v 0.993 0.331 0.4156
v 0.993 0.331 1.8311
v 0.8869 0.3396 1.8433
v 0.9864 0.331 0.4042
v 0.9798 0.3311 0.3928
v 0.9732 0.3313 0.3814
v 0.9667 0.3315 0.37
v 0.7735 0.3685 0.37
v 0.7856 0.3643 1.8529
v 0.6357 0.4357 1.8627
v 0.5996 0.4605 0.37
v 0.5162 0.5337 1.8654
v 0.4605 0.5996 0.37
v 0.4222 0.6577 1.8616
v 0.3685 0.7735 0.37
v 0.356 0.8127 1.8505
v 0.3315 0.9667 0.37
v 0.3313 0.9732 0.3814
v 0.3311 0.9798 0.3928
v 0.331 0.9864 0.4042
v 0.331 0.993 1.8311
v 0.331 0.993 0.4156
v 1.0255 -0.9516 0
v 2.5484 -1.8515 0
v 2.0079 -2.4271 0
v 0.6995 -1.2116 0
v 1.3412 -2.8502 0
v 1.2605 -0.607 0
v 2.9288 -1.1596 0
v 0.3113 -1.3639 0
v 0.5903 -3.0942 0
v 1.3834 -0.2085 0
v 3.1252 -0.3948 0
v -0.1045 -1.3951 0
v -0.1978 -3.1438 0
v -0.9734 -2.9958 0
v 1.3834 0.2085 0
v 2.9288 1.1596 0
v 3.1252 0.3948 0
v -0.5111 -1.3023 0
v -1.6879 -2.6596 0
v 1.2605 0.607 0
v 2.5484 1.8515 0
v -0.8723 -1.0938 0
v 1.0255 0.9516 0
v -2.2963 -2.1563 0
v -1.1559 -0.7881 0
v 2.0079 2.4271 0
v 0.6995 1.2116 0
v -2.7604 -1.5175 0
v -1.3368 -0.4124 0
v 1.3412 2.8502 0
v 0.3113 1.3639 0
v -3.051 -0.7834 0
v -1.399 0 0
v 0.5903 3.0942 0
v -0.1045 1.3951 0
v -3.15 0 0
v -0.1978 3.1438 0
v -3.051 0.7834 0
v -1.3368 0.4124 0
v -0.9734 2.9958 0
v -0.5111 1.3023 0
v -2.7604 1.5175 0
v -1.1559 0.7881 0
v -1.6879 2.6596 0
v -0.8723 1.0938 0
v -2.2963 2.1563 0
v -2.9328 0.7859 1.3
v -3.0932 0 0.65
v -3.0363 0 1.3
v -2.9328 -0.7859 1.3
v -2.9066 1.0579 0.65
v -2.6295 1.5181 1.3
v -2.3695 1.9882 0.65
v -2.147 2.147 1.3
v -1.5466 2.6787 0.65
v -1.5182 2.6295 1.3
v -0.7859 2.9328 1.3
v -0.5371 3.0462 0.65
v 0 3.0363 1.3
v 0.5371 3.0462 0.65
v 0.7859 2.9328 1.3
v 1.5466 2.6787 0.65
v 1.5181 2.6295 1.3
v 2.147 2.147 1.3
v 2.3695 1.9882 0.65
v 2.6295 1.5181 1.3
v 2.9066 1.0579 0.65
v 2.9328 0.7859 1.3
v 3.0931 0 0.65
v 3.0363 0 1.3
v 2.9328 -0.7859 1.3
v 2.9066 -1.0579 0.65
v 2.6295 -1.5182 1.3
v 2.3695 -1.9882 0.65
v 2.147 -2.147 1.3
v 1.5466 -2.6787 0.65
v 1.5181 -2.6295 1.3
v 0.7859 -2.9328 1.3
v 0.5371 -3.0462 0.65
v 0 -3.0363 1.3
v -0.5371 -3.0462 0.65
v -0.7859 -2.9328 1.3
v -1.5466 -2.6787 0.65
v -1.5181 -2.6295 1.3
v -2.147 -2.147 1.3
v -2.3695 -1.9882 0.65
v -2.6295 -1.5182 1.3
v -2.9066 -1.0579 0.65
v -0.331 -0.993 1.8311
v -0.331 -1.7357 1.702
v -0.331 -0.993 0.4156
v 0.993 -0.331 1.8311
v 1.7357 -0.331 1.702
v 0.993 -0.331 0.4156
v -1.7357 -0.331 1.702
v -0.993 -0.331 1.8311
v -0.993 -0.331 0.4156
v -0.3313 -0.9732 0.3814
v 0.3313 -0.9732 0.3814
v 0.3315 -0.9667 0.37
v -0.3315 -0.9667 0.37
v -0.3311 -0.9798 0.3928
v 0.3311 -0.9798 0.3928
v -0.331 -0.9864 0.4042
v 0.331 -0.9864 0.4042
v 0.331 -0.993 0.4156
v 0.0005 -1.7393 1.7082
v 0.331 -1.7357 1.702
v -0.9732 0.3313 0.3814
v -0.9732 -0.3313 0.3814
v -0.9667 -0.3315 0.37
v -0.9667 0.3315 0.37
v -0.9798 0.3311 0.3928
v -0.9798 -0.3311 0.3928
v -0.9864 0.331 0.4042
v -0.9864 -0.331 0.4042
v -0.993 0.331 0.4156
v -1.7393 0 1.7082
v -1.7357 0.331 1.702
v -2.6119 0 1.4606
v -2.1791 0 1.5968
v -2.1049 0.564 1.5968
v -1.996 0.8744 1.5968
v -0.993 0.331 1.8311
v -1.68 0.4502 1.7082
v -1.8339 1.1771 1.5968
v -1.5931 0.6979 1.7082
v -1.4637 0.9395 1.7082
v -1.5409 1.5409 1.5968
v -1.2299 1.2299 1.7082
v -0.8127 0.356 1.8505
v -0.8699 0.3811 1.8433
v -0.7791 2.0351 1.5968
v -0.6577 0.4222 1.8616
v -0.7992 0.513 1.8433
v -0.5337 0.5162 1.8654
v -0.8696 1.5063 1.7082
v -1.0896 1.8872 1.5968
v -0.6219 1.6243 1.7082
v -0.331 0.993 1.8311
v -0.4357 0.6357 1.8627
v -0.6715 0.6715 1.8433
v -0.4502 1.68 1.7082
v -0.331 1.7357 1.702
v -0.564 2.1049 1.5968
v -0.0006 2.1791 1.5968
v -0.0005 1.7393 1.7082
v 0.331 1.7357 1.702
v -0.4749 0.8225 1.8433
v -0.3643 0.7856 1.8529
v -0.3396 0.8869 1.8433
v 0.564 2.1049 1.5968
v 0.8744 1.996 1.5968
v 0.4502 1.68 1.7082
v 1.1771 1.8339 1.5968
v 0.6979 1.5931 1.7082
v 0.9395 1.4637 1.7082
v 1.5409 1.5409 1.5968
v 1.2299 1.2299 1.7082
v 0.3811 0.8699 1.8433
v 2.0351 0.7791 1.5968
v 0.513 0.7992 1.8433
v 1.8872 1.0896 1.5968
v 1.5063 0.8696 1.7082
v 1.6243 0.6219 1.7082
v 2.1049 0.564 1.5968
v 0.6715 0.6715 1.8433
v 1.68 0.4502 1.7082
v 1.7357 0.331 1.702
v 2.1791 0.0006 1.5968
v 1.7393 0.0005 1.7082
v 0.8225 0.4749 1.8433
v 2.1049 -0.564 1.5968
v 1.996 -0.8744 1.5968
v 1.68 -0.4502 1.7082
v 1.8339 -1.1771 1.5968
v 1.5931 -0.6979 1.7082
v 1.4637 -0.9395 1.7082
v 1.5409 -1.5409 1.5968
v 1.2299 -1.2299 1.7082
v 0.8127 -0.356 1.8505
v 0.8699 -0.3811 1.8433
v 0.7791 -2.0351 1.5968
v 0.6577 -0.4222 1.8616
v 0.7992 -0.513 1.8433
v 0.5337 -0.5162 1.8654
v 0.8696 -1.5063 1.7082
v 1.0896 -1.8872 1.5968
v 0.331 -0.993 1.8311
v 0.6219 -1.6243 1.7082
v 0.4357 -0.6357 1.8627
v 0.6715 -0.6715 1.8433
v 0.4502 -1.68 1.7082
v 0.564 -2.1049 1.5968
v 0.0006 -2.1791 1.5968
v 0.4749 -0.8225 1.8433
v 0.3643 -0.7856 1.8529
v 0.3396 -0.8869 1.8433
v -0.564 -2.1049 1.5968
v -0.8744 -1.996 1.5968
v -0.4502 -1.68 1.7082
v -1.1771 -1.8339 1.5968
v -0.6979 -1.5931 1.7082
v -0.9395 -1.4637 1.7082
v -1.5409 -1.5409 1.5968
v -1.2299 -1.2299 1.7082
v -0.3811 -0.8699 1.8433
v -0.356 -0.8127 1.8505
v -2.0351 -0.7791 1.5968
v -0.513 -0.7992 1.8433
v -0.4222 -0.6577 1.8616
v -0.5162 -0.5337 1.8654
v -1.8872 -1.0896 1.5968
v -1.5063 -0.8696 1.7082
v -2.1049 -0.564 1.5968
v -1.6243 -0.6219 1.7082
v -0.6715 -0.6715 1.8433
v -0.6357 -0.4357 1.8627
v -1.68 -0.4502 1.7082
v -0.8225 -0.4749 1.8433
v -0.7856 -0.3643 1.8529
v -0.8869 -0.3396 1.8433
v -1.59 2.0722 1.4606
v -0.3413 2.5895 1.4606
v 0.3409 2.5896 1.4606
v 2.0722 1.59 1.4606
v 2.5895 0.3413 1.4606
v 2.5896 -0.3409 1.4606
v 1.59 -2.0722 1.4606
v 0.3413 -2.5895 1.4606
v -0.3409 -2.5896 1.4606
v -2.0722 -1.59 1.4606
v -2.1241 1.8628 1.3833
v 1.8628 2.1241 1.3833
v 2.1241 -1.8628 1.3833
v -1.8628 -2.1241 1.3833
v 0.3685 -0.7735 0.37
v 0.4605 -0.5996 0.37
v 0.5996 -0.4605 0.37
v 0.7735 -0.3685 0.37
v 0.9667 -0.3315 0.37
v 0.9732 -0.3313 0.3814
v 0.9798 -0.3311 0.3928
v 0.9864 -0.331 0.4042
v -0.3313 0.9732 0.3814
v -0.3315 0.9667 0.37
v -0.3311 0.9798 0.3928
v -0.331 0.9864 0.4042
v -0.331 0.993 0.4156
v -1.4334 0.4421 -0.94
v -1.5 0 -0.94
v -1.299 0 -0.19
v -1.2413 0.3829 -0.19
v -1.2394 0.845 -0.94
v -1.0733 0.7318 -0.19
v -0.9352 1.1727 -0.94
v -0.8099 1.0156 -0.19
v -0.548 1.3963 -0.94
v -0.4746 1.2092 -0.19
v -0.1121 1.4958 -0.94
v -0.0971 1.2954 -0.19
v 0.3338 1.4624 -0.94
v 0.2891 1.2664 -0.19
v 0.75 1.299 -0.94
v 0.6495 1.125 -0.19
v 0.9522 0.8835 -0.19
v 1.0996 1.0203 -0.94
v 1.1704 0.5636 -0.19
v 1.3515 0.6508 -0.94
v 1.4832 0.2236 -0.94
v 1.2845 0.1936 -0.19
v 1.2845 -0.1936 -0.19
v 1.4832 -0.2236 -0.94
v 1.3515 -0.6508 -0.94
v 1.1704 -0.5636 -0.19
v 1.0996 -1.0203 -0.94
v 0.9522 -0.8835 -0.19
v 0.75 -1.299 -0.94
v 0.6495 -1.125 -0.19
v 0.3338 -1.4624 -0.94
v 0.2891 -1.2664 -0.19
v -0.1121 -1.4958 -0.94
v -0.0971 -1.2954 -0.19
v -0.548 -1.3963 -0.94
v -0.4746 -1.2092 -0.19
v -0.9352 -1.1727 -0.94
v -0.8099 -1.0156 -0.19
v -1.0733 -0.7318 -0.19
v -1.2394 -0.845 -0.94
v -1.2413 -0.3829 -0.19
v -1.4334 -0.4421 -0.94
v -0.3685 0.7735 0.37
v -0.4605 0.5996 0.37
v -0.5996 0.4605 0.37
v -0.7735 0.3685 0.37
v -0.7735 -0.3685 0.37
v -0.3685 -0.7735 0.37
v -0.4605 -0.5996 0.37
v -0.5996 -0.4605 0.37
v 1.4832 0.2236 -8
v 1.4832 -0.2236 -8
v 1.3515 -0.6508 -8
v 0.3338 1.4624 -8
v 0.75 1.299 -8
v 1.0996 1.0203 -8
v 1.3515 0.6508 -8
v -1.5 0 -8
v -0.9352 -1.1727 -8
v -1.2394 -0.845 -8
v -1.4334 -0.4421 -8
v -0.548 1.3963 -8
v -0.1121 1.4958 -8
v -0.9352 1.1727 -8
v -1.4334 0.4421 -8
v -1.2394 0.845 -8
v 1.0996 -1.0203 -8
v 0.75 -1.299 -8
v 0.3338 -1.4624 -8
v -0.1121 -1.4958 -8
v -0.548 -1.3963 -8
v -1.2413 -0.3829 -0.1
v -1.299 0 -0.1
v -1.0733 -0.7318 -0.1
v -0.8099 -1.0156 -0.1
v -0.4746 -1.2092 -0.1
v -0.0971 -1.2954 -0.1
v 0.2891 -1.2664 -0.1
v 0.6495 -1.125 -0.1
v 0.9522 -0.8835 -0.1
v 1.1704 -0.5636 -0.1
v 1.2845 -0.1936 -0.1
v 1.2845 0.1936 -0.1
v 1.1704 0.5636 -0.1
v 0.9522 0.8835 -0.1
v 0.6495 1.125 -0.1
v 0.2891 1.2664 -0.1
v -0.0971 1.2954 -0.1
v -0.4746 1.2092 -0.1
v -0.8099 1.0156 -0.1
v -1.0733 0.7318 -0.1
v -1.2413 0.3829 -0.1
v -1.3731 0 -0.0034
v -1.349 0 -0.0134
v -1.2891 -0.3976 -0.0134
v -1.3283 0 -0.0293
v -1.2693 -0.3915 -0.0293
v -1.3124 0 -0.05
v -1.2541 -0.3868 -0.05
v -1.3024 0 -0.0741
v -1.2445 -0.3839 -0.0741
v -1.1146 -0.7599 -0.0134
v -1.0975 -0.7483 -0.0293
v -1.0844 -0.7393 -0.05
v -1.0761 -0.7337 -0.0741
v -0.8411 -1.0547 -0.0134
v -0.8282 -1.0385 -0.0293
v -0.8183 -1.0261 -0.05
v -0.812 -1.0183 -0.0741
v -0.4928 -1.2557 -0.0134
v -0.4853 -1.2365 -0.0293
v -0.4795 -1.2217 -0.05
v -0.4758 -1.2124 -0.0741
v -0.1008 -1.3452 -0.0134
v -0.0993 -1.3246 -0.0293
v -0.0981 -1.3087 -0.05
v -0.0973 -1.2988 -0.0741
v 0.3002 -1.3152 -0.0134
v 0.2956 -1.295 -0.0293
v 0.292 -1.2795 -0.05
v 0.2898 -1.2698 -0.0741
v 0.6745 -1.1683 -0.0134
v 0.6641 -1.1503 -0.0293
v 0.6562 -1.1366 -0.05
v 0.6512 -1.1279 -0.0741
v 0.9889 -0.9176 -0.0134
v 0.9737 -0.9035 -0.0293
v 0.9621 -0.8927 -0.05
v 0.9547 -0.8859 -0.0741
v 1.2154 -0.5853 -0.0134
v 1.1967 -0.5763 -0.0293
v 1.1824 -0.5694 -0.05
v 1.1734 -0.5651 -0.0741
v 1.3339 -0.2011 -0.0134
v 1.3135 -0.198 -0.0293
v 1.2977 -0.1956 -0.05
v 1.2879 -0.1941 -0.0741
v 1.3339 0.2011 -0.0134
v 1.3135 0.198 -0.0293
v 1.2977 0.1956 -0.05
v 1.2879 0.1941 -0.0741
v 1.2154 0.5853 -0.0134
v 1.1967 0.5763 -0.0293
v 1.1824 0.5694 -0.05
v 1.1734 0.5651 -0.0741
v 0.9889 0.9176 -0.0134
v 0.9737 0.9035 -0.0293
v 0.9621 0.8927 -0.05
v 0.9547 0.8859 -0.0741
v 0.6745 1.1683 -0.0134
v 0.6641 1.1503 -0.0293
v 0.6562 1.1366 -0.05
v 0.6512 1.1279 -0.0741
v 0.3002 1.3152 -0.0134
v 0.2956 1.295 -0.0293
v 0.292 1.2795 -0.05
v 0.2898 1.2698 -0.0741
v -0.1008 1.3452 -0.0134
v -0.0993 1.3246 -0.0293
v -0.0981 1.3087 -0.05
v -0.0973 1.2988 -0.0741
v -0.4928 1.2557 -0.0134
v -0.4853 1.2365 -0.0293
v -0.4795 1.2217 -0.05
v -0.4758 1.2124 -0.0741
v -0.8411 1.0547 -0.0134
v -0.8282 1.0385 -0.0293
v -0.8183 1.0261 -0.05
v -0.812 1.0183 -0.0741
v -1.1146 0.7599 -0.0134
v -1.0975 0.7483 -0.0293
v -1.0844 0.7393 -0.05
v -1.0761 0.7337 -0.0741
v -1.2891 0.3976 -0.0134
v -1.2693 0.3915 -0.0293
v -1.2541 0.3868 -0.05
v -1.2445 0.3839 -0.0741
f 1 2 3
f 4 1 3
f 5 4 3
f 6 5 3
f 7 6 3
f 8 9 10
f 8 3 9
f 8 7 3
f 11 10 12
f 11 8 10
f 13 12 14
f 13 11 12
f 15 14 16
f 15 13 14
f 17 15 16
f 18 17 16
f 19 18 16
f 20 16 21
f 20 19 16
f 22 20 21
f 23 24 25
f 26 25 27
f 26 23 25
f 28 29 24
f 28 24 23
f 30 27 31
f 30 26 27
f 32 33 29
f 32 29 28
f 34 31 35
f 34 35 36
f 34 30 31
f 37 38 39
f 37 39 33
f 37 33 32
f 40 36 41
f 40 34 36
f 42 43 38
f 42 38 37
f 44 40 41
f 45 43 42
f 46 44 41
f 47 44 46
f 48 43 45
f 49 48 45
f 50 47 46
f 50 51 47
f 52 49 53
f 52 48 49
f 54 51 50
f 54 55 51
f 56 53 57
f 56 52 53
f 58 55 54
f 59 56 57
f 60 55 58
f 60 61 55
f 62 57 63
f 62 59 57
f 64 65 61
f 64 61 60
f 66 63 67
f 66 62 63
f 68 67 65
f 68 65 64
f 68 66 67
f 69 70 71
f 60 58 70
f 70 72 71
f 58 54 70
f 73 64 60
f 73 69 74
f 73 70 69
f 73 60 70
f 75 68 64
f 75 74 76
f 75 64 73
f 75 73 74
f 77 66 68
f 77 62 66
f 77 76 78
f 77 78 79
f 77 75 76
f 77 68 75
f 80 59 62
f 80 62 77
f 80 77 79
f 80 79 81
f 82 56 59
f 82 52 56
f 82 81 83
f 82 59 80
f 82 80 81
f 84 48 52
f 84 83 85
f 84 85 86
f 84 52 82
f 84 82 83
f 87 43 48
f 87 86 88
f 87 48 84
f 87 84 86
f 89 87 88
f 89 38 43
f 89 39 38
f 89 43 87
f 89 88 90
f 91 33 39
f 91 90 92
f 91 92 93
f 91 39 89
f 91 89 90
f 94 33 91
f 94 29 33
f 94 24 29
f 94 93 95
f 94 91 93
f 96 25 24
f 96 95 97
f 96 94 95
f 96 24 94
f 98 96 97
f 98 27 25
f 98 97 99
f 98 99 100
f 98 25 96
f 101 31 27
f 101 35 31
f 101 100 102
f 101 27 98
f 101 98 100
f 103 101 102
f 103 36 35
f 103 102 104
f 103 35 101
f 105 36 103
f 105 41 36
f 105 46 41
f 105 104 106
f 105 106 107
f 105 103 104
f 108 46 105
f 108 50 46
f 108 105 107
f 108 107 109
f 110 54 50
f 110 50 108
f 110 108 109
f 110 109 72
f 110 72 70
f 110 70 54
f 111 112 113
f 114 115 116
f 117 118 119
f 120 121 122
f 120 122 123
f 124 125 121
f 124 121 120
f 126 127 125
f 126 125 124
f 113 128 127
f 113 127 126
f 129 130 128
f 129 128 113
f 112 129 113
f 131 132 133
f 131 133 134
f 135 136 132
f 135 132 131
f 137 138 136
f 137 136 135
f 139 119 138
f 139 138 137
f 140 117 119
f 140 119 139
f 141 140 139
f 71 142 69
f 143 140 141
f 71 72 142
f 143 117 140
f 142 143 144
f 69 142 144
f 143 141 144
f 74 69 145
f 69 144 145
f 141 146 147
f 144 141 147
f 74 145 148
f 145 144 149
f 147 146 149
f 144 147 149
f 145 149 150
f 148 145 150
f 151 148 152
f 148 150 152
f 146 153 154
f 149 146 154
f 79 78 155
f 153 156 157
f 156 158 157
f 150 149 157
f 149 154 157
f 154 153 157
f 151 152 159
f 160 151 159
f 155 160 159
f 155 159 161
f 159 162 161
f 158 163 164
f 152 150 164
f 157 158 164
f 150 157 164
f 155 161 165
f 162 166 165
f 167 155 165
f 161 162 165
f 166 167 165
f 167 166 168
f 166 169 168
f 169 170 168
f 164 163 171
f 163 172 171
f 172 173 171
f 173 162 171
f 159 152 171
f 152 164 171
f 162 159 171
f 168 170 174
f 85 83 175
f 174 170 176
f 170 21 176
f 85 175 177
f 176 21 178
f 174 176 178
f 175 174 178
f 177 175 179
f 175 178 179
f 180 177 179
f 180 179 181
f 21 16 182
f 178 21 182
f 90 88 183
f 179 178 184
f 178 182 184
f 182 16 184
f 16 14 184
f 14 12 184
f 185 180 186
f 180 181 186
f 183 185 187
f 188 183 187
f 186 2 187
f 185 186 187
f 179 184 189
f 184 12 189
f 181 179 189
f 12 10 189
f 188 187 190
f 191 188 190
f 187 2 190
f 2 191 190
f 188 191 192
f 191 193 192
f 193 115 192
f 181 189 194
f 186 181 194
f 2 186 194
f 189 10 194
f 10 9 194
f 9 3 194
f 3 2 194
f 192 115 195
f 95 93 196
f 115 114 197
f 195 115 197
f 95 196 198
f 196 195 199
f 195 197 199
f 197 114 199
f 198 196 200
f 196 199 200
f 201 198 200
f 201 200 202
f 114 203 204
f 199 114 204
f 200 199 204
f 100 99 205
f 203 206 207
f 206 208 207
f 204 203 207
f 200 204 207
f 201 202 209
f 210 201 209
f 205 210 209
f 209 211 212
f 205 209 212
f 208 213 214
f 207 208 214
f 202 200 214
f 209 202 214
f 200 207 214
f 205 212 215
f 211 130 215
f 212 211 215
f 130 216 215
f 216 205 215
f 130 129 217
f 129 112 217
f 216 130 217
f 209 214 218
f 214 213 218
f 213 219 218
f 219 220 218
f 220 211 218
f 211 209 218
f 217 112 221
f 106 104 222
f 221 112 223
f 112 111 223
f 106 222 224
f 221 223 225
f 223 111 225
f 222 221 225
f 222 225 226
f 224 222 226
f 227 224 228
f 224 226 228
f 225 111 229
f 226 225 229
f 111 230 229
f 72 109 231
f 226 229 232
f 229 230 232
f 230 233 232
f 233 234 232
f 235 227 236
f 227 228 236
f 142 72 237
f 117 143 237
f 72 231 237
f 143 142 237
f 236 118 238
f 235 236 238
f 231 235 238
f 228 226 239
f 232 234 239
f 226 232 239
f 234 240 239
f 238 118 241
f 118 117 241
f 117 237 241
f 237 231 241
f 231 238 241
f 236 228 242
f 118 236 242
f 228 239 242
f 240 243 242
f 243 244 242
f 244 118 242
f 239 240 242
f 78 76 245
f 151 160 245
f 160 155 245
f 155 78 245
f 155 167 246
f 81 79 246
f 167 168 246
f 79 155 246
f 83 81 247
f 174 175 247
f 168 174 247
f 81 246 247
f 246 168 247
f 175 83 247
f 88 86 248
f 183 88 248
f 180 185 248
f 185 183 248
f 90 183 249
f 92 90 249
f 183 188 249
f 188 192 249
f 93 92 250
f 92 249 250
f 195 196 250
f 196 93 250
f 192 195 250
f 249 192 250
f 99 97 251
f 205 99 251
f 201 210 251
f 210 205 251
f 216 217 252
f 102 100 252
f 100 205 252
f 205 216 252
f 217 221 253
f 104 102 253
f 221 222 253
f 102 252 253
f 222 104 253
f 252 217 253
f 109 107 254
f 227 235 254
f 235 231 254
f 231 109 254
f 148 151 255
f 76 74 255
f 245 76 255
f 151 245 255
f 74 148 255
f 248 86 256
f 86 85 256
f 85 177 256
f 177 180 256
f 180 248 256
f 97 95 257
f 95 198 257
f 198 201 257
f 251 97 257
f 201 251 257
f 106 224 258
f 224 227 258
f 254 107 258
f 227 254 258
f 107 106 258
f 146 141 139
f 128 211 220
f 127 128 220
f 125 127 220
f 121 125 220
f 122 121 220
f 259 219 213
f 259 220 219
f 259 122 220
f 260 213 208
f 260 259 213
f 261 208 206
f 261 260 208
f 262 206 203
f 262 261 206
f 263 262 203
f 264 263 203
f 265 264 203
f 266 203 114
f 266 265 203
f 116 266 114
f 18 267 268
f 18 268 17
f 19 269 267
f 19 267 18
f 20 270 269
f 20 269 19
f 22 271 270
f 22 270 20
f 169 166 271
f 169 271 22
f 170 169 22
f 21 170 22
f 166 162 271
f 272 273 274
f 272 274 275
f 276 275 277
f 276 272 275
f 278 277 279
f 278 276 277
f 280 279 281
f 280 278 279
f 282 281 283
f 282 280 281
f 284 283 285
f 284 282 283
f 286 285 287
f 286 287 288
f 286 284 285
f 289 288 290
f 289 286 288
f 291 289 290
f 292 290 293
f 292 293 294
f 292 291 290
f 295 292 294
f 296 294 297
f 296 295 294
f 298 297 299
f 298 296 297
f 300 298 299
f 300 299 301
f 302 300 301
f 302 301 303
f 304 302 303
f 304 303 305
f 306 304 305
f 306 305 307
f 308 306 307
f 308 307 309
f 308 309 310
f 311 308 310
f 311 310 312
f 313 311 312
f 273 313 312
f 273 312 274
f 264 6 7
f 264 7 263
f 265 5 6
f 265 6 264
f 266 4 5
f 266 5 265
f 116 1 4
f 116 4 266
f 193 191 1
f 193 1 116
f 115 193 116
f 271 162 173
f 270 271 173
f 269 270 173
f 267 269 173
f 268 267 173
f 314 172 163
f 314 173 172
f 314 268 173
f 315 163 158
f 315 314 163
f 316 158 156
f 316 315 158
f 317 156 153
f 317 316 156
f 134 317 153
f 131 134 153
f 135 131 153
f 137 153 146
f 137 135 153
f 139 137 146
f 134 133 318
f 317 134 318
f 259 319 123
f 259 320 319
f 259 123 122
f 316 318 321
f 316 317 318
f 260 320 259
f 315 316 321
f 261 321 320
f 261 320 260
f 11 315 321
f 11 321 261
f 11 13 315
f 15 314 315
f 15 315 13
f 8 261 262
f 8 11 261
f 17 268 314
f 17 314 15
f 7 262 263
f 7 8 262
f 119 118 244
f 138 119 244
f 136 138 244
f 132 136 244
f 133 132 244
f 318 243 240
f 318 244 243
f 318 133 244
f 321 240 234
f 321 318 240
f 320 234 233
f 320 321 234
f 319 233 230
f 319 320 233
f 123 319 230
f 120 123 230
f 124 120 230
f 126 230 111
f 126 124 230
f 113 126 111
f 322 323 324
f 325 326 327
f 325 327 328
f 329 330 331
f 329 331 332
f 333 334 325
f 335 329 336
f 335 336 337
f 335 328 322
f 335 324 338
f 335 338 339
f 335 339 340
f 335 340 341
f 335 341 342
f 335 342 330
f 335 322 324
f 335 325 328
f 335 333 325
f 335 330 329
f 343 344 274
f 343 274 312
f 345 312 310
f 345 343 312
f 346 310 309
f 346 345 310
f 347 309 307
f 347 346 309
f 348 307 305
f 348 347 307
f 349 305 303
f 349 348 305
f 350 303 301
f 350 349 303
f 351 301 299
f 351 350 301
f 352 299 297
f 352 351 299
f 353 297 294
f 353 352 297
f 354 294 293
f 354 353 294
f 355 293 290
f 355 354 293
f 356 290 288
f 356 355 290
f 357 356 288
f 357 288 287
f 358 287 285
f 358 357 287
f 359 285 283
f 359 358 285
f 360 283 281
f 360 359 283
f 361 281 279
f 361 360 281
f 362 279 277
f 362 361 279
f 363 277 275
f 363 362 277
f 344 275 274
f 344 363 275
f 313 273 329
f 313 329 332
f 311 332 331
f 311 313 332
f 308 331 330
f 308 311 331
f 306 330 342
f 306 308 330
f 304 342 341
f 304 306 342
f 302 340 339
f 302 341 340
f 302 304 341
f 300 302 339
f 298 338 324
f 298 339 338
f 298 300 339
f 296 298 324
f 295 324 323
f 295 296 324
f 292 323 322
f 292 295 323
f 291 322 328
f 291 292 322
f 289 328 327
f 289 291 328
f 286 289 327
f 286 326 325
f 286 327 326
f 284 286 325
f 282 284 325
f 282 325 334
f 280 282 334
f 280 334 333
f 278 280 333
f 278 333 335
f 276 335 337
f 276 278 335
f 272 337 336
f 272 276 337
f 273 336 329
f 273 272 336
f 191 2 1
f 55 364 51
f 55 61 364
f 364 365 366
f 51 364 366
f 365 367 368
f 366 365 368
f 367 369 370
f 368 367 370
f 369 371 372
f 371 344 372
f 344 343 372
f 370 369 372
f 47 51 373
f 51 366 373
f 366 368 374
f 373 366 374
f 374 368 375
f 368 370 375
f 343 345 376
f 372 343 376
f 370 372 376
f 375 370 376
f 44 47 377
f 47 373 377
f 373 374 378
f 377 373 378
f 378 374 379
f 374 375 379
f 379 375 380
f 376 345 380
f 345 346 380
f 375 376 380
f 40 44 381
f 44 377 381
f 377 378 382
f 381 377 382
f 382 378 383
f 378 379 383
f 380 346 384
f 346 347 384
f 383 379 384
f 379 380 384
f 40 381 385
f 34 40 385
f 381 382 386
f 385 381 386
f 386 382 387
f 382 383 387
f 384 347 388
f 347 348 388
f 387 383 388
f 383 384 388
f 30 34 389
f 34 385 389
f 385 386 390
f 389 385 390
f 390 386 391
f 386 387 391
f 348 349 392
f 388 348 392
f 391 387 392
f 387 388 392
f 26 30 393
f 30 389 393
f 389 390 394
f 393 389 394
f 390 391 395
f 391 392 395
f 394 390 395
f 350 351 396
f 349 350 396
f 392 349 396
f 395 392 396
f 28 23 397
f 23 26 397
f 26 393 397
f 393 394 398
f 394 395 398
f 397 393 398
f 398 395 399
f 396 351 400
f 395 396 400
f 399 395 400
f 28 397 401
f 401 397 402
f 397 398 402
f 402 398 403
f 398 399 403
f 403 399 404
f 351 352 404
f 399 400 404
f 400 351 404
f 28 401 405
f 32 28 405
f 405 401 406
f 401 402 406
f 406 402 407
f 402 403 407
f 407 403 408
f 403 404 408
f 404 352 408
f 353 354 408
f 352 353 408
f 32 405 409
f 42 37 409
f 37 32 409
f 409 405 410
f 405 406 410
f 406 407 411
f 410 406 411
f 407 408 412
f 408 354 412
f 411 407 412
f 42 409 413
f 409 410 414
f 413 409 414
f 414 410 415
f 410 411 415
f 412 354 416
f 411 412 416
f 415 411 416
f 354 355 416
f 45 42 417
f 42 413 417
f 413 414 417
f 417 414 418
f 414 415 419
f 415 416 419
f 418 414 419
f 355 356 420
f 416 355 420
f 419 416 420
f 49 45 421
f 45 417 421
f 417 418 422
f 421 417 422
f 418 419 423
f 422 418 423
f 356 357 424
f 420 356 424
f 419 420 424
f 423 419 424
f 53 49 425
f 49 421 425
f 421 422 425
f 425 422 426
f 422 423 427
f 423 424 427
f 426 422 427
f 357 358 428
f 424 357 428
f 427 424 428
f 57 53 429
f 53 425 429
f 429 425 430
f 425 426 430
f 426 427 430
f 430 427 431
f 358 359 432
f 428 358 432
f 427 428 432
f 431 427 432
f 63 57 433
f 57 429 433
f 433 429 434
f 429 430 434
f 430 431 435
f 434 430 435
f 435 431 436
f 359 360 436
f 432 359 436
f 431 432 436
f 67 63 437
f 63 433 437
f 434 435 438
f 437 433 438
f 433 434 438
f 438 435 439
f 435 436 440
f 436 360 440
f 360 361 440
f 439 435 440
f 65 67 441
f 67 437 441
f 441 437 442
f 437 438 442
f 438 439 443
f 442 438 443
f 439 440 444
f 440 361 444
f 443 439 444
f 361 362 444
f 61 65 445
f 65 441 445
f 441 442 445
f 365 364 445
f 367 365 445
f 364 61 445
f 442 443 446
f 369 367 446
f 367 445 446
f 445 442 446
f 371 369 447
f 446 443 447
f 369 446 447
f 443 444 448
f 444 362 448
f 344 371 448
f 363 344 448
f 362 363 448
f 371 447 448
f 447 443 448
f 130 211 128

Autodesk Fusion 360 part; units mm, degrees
sketch "Sketch1" plane through (0, 0, 0) normal (0, 1, 0) x (1, 0, 0)
  line L0 (0, -1.9) -> (0, 8)
  line L1 (-3.15, 0) -> (-3.0363, -1.3)
  line L2 (-3.15, 0) -> (-1.299, 0)
  arc A0 (-3.0363, -1.3) -> (0, -1.9) centre (0, 6.0824) ccw
  line L3 (0, 8) -> (-1.5, 8)
  line L4 (-1.5, 8) -> (-1.5, 0.94)
  line L5 (-1.5, 0.94) -> (-1.299, 0.19)
  line L6 (-1.299, 0.19) -> (-1.299, 0)
  dimension "d13" = 5
  dimension "d14" = 6.3
  dimension "d18" = 3
  dimension "d23" = 15
  dimension "d53" = 1.9
  dimension "d55" = 7.06
  dimension "d56" = 8
  dimension "d57" = 7.81
  dimension "d60" = 1.3
revolve "Revolve1" add sketch "Sketch1" angle 360 about axis through (0, 0, 1.9) along (0, 0, -1) makes body 1
fillet "Fillet2" radius 0.1 1 edges at (-1.2111, 0.4698, 0) on bodies 1
ref_plane "WorkPlane1" through (0, 0, 1.9) normal (0, 0, 1) x (1, 0, 0)
sketch "Sketch2" plane through (0, 0, 1.9) normal (0, 0, 1) x (1, 0, 0)
  line L0 (-1.85, 0) -> (1.85, 0) construction
  line L1 (0, -1.85) -> (0, 1.85) construction
  line L2 (-0.331, 1.85) -> (0.331, 1.85)
  line L3 (0.331, 1.85) -> (0.331, 0.331)
  line L4 (0.331, 0.331) -> (1.85, 0.331)
  line L5 (1.85, 0.331) -> (1.85, -0.331)
  line L6 (1.85, -0.331) -> (0.331, -0.331)
  line L7 (0.331, -0.331) -> (0.331, -1.85)
  line L8 (0.331, -1.85) -> (-0.331, -1.85)
  line L9 (-0.331, -1.85) -> (-0.331, -0.331)
  line L10 (-0.331, -0.331) -> (-1.85, -0.331)
  line L11 (-1.85, -0.331) -> (-1.85, 0.331)
  line L12 (-1.85, 0.331) -> (-0.331, 0.331)
  line L13 (-0.331, 0.331) -> (-0.331, 1.85)
  dimension "d58" = 0.662
  dimension "d59" = 0.662
  dimension "d61" = 3.7
  dimension "d62" = 3.7
extrude "Extrude1" add sketch "Sketch2" against normal blind 1.53 separate body makes body 2
draft "Draft1" angle -30 neutral plane through (0, 0, 1.9) pull (0, 0, 1) 4 faces at (0.1103, -1.85, 1.39) (-0.1103, 1.85, 1.39) (-1.85, -0.1103, 1.39) (1.85, 0.1103, 1.39) on bodies 2
fillet "Fillet1" radius 0.662 4 edges at (0.331, -0.331, 1.135) (-0.331, -0.331, 1.135) (-0.331, 0.331, 1.135) (0.331, 0.331, 1.135) on bodies 2
combine "Combine1" operation cut target body 1 tool bodies 2
thread "Thread1" thread offset 0 thread length 10
equation "adsk_nomdia = 3.00 mm"
equation "adsk_nomlen = 8.00 mm"
equation "adsk_headdia = 6.30 mm"
equation "adsk_baseh = 1.30 mm"
equation "adsk_phildia = 3.70 mm"
equation "adsk_midfillet = 0.10 mm"
equation "adsk_thrlen = 7.06 mm"
equation "adsk_phildepth = 1.53 mm"
equation "adsk_thrrun = 0.75 mm"
equation "adsk_thrang = 15.00 deg"
equation "adsk_headang = 5.00 deg"
equation "d13 = adsk_headang"
equation "d14 = adsk_headdia"
equation "adsk_ovalh = 0.60 mm"
equation "d18 = adsk_nomdia"
equation "d23 = adsk_thrang"
equation "d32 = adsk_baseh + adsk_ovalh"
equation "adsk_philwidth = 0.662 mm"
equation "d48 = adsk_philwidth"
equation "d52 = adsk_midfillet"
equation "d53 = adsk_baseh + adsk_ovalh"
equation "d55 = adsk_thrlen"
equation "d56 = adsk_nomlen"
equation "d57 = adsk_thrlen + adsk_thrrun"
equation "d58 = adsk_philwidth"
equation "d59 = adsk_philwidth"
equation "d60 = adsk_baseh"
equation "d61 = adsk_phildia"
equation "d62 = adsk_phildia"
properties part number "BHS JIS B 1111 - M3x8 Steel 4.6 Plain"
